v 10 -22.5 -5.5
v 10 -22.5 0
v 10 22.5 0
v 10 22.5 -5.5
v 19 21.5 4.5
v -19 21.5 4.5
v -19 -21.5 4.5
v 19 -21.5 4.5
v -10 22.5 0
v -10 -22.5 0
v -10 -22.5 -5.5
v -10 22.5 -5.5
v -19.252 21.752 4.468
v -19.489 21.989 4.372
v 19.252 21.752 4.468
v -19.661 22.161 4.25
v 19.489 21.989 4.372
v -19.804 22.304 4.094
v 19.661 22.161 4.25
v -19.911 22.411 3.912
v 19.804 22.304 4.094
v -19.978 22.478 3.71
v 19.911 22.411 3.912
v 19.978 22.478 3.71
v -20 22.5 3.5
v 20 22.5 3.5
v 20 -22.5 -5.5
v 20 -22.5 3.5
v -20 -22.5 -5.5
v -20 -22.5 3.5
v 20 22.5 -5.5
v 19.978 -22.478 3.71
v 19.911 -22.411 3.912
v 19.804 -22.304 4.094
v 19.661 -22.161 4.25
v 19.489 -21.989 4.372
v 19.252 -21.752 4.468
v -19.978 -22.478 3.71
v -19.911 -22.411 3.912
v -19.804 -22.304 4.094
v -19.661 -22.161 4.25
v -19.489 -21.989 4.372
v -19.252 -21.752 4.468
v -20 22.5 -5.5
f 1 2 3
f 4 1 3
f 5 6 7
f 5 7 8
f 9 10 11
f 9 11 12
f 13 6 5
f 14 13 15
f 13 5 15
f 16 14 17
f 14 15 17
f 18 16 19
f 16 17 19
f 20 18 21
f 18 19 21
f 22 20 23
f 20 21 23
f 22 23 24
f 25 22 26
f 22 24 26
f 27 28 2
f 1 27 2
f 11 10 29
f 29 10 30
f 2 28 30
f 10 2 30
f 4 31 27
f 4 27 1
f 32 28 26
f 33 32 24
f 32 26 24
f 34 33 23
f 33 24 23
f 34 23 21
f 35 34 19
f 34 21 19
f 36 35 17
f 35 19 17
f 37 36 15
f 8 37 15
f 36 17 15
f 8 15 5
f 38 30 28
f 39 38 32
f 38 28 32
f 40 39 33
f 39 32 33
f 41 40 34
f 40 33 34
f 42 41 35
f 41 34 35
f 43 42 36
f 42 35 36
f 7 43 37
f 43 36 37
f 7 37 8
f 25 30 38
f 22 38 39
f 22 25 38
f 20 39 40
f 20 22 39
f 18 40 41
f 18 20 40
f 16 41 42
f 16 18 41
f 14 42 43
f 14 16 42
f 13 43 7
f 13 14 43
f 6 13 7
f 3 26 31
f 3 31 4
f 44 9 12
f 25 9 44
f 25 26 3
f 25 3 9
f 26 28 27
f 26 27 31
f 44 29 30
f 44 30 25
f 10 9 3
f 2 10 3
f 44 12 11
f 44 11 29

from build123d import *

# Parameters (mm, degrees)
CROQUIS1_W              = 40
CROQUIS1_H              = 45
SALIENTE_EXTRUIR1_DEPTH = 4.5
CROQUIS2_W              = 10
CROQUIS2_H              = 45
SALIENTE_EXTRUIR2_DEPTH = 5.5
REDONDEO1_R             = 1


with BuildPart() as part:
    # Croquis1 → Saliente-Extruir1 (new body)
    with BuildSketch(Plane.XY):
        Rectangle(CROQUIS1_W, CROQUIS1_H)
    extrude(amount=SALIENTE_EXTRUIR1_DEPTH)

    # Croquis2 → Saliente-Extruir2 (add)
    with BuildSketch(Plane(origin=(0, 0, 0), x_dir=(-1, 0, 0), z_dir=(0, 0, -1))):
        with Locations((-15, 0)):
            Rectangle(CROQUIS2_W, CROQUIS2_H)
        with Locations((15, 0)):
            Rectangle(CROQUIS2_W, CROQUIS2_H)
    extrude(amount=SALIENTE_EXTRUIR2_DEPTH)

    # Redondeo1
    redondeo1_edges = [part.edges().sort_by_distance(p)[0] for p in [
        (-20, 0, 4.5),
        (0, -22.5, 4.5),
        (20, 0, 4.5),
        (0, 22.5, 4.5),
    ]]
    fillet(redondeo1_edges, radius=REDONDEO1_R)


solid = part.part
